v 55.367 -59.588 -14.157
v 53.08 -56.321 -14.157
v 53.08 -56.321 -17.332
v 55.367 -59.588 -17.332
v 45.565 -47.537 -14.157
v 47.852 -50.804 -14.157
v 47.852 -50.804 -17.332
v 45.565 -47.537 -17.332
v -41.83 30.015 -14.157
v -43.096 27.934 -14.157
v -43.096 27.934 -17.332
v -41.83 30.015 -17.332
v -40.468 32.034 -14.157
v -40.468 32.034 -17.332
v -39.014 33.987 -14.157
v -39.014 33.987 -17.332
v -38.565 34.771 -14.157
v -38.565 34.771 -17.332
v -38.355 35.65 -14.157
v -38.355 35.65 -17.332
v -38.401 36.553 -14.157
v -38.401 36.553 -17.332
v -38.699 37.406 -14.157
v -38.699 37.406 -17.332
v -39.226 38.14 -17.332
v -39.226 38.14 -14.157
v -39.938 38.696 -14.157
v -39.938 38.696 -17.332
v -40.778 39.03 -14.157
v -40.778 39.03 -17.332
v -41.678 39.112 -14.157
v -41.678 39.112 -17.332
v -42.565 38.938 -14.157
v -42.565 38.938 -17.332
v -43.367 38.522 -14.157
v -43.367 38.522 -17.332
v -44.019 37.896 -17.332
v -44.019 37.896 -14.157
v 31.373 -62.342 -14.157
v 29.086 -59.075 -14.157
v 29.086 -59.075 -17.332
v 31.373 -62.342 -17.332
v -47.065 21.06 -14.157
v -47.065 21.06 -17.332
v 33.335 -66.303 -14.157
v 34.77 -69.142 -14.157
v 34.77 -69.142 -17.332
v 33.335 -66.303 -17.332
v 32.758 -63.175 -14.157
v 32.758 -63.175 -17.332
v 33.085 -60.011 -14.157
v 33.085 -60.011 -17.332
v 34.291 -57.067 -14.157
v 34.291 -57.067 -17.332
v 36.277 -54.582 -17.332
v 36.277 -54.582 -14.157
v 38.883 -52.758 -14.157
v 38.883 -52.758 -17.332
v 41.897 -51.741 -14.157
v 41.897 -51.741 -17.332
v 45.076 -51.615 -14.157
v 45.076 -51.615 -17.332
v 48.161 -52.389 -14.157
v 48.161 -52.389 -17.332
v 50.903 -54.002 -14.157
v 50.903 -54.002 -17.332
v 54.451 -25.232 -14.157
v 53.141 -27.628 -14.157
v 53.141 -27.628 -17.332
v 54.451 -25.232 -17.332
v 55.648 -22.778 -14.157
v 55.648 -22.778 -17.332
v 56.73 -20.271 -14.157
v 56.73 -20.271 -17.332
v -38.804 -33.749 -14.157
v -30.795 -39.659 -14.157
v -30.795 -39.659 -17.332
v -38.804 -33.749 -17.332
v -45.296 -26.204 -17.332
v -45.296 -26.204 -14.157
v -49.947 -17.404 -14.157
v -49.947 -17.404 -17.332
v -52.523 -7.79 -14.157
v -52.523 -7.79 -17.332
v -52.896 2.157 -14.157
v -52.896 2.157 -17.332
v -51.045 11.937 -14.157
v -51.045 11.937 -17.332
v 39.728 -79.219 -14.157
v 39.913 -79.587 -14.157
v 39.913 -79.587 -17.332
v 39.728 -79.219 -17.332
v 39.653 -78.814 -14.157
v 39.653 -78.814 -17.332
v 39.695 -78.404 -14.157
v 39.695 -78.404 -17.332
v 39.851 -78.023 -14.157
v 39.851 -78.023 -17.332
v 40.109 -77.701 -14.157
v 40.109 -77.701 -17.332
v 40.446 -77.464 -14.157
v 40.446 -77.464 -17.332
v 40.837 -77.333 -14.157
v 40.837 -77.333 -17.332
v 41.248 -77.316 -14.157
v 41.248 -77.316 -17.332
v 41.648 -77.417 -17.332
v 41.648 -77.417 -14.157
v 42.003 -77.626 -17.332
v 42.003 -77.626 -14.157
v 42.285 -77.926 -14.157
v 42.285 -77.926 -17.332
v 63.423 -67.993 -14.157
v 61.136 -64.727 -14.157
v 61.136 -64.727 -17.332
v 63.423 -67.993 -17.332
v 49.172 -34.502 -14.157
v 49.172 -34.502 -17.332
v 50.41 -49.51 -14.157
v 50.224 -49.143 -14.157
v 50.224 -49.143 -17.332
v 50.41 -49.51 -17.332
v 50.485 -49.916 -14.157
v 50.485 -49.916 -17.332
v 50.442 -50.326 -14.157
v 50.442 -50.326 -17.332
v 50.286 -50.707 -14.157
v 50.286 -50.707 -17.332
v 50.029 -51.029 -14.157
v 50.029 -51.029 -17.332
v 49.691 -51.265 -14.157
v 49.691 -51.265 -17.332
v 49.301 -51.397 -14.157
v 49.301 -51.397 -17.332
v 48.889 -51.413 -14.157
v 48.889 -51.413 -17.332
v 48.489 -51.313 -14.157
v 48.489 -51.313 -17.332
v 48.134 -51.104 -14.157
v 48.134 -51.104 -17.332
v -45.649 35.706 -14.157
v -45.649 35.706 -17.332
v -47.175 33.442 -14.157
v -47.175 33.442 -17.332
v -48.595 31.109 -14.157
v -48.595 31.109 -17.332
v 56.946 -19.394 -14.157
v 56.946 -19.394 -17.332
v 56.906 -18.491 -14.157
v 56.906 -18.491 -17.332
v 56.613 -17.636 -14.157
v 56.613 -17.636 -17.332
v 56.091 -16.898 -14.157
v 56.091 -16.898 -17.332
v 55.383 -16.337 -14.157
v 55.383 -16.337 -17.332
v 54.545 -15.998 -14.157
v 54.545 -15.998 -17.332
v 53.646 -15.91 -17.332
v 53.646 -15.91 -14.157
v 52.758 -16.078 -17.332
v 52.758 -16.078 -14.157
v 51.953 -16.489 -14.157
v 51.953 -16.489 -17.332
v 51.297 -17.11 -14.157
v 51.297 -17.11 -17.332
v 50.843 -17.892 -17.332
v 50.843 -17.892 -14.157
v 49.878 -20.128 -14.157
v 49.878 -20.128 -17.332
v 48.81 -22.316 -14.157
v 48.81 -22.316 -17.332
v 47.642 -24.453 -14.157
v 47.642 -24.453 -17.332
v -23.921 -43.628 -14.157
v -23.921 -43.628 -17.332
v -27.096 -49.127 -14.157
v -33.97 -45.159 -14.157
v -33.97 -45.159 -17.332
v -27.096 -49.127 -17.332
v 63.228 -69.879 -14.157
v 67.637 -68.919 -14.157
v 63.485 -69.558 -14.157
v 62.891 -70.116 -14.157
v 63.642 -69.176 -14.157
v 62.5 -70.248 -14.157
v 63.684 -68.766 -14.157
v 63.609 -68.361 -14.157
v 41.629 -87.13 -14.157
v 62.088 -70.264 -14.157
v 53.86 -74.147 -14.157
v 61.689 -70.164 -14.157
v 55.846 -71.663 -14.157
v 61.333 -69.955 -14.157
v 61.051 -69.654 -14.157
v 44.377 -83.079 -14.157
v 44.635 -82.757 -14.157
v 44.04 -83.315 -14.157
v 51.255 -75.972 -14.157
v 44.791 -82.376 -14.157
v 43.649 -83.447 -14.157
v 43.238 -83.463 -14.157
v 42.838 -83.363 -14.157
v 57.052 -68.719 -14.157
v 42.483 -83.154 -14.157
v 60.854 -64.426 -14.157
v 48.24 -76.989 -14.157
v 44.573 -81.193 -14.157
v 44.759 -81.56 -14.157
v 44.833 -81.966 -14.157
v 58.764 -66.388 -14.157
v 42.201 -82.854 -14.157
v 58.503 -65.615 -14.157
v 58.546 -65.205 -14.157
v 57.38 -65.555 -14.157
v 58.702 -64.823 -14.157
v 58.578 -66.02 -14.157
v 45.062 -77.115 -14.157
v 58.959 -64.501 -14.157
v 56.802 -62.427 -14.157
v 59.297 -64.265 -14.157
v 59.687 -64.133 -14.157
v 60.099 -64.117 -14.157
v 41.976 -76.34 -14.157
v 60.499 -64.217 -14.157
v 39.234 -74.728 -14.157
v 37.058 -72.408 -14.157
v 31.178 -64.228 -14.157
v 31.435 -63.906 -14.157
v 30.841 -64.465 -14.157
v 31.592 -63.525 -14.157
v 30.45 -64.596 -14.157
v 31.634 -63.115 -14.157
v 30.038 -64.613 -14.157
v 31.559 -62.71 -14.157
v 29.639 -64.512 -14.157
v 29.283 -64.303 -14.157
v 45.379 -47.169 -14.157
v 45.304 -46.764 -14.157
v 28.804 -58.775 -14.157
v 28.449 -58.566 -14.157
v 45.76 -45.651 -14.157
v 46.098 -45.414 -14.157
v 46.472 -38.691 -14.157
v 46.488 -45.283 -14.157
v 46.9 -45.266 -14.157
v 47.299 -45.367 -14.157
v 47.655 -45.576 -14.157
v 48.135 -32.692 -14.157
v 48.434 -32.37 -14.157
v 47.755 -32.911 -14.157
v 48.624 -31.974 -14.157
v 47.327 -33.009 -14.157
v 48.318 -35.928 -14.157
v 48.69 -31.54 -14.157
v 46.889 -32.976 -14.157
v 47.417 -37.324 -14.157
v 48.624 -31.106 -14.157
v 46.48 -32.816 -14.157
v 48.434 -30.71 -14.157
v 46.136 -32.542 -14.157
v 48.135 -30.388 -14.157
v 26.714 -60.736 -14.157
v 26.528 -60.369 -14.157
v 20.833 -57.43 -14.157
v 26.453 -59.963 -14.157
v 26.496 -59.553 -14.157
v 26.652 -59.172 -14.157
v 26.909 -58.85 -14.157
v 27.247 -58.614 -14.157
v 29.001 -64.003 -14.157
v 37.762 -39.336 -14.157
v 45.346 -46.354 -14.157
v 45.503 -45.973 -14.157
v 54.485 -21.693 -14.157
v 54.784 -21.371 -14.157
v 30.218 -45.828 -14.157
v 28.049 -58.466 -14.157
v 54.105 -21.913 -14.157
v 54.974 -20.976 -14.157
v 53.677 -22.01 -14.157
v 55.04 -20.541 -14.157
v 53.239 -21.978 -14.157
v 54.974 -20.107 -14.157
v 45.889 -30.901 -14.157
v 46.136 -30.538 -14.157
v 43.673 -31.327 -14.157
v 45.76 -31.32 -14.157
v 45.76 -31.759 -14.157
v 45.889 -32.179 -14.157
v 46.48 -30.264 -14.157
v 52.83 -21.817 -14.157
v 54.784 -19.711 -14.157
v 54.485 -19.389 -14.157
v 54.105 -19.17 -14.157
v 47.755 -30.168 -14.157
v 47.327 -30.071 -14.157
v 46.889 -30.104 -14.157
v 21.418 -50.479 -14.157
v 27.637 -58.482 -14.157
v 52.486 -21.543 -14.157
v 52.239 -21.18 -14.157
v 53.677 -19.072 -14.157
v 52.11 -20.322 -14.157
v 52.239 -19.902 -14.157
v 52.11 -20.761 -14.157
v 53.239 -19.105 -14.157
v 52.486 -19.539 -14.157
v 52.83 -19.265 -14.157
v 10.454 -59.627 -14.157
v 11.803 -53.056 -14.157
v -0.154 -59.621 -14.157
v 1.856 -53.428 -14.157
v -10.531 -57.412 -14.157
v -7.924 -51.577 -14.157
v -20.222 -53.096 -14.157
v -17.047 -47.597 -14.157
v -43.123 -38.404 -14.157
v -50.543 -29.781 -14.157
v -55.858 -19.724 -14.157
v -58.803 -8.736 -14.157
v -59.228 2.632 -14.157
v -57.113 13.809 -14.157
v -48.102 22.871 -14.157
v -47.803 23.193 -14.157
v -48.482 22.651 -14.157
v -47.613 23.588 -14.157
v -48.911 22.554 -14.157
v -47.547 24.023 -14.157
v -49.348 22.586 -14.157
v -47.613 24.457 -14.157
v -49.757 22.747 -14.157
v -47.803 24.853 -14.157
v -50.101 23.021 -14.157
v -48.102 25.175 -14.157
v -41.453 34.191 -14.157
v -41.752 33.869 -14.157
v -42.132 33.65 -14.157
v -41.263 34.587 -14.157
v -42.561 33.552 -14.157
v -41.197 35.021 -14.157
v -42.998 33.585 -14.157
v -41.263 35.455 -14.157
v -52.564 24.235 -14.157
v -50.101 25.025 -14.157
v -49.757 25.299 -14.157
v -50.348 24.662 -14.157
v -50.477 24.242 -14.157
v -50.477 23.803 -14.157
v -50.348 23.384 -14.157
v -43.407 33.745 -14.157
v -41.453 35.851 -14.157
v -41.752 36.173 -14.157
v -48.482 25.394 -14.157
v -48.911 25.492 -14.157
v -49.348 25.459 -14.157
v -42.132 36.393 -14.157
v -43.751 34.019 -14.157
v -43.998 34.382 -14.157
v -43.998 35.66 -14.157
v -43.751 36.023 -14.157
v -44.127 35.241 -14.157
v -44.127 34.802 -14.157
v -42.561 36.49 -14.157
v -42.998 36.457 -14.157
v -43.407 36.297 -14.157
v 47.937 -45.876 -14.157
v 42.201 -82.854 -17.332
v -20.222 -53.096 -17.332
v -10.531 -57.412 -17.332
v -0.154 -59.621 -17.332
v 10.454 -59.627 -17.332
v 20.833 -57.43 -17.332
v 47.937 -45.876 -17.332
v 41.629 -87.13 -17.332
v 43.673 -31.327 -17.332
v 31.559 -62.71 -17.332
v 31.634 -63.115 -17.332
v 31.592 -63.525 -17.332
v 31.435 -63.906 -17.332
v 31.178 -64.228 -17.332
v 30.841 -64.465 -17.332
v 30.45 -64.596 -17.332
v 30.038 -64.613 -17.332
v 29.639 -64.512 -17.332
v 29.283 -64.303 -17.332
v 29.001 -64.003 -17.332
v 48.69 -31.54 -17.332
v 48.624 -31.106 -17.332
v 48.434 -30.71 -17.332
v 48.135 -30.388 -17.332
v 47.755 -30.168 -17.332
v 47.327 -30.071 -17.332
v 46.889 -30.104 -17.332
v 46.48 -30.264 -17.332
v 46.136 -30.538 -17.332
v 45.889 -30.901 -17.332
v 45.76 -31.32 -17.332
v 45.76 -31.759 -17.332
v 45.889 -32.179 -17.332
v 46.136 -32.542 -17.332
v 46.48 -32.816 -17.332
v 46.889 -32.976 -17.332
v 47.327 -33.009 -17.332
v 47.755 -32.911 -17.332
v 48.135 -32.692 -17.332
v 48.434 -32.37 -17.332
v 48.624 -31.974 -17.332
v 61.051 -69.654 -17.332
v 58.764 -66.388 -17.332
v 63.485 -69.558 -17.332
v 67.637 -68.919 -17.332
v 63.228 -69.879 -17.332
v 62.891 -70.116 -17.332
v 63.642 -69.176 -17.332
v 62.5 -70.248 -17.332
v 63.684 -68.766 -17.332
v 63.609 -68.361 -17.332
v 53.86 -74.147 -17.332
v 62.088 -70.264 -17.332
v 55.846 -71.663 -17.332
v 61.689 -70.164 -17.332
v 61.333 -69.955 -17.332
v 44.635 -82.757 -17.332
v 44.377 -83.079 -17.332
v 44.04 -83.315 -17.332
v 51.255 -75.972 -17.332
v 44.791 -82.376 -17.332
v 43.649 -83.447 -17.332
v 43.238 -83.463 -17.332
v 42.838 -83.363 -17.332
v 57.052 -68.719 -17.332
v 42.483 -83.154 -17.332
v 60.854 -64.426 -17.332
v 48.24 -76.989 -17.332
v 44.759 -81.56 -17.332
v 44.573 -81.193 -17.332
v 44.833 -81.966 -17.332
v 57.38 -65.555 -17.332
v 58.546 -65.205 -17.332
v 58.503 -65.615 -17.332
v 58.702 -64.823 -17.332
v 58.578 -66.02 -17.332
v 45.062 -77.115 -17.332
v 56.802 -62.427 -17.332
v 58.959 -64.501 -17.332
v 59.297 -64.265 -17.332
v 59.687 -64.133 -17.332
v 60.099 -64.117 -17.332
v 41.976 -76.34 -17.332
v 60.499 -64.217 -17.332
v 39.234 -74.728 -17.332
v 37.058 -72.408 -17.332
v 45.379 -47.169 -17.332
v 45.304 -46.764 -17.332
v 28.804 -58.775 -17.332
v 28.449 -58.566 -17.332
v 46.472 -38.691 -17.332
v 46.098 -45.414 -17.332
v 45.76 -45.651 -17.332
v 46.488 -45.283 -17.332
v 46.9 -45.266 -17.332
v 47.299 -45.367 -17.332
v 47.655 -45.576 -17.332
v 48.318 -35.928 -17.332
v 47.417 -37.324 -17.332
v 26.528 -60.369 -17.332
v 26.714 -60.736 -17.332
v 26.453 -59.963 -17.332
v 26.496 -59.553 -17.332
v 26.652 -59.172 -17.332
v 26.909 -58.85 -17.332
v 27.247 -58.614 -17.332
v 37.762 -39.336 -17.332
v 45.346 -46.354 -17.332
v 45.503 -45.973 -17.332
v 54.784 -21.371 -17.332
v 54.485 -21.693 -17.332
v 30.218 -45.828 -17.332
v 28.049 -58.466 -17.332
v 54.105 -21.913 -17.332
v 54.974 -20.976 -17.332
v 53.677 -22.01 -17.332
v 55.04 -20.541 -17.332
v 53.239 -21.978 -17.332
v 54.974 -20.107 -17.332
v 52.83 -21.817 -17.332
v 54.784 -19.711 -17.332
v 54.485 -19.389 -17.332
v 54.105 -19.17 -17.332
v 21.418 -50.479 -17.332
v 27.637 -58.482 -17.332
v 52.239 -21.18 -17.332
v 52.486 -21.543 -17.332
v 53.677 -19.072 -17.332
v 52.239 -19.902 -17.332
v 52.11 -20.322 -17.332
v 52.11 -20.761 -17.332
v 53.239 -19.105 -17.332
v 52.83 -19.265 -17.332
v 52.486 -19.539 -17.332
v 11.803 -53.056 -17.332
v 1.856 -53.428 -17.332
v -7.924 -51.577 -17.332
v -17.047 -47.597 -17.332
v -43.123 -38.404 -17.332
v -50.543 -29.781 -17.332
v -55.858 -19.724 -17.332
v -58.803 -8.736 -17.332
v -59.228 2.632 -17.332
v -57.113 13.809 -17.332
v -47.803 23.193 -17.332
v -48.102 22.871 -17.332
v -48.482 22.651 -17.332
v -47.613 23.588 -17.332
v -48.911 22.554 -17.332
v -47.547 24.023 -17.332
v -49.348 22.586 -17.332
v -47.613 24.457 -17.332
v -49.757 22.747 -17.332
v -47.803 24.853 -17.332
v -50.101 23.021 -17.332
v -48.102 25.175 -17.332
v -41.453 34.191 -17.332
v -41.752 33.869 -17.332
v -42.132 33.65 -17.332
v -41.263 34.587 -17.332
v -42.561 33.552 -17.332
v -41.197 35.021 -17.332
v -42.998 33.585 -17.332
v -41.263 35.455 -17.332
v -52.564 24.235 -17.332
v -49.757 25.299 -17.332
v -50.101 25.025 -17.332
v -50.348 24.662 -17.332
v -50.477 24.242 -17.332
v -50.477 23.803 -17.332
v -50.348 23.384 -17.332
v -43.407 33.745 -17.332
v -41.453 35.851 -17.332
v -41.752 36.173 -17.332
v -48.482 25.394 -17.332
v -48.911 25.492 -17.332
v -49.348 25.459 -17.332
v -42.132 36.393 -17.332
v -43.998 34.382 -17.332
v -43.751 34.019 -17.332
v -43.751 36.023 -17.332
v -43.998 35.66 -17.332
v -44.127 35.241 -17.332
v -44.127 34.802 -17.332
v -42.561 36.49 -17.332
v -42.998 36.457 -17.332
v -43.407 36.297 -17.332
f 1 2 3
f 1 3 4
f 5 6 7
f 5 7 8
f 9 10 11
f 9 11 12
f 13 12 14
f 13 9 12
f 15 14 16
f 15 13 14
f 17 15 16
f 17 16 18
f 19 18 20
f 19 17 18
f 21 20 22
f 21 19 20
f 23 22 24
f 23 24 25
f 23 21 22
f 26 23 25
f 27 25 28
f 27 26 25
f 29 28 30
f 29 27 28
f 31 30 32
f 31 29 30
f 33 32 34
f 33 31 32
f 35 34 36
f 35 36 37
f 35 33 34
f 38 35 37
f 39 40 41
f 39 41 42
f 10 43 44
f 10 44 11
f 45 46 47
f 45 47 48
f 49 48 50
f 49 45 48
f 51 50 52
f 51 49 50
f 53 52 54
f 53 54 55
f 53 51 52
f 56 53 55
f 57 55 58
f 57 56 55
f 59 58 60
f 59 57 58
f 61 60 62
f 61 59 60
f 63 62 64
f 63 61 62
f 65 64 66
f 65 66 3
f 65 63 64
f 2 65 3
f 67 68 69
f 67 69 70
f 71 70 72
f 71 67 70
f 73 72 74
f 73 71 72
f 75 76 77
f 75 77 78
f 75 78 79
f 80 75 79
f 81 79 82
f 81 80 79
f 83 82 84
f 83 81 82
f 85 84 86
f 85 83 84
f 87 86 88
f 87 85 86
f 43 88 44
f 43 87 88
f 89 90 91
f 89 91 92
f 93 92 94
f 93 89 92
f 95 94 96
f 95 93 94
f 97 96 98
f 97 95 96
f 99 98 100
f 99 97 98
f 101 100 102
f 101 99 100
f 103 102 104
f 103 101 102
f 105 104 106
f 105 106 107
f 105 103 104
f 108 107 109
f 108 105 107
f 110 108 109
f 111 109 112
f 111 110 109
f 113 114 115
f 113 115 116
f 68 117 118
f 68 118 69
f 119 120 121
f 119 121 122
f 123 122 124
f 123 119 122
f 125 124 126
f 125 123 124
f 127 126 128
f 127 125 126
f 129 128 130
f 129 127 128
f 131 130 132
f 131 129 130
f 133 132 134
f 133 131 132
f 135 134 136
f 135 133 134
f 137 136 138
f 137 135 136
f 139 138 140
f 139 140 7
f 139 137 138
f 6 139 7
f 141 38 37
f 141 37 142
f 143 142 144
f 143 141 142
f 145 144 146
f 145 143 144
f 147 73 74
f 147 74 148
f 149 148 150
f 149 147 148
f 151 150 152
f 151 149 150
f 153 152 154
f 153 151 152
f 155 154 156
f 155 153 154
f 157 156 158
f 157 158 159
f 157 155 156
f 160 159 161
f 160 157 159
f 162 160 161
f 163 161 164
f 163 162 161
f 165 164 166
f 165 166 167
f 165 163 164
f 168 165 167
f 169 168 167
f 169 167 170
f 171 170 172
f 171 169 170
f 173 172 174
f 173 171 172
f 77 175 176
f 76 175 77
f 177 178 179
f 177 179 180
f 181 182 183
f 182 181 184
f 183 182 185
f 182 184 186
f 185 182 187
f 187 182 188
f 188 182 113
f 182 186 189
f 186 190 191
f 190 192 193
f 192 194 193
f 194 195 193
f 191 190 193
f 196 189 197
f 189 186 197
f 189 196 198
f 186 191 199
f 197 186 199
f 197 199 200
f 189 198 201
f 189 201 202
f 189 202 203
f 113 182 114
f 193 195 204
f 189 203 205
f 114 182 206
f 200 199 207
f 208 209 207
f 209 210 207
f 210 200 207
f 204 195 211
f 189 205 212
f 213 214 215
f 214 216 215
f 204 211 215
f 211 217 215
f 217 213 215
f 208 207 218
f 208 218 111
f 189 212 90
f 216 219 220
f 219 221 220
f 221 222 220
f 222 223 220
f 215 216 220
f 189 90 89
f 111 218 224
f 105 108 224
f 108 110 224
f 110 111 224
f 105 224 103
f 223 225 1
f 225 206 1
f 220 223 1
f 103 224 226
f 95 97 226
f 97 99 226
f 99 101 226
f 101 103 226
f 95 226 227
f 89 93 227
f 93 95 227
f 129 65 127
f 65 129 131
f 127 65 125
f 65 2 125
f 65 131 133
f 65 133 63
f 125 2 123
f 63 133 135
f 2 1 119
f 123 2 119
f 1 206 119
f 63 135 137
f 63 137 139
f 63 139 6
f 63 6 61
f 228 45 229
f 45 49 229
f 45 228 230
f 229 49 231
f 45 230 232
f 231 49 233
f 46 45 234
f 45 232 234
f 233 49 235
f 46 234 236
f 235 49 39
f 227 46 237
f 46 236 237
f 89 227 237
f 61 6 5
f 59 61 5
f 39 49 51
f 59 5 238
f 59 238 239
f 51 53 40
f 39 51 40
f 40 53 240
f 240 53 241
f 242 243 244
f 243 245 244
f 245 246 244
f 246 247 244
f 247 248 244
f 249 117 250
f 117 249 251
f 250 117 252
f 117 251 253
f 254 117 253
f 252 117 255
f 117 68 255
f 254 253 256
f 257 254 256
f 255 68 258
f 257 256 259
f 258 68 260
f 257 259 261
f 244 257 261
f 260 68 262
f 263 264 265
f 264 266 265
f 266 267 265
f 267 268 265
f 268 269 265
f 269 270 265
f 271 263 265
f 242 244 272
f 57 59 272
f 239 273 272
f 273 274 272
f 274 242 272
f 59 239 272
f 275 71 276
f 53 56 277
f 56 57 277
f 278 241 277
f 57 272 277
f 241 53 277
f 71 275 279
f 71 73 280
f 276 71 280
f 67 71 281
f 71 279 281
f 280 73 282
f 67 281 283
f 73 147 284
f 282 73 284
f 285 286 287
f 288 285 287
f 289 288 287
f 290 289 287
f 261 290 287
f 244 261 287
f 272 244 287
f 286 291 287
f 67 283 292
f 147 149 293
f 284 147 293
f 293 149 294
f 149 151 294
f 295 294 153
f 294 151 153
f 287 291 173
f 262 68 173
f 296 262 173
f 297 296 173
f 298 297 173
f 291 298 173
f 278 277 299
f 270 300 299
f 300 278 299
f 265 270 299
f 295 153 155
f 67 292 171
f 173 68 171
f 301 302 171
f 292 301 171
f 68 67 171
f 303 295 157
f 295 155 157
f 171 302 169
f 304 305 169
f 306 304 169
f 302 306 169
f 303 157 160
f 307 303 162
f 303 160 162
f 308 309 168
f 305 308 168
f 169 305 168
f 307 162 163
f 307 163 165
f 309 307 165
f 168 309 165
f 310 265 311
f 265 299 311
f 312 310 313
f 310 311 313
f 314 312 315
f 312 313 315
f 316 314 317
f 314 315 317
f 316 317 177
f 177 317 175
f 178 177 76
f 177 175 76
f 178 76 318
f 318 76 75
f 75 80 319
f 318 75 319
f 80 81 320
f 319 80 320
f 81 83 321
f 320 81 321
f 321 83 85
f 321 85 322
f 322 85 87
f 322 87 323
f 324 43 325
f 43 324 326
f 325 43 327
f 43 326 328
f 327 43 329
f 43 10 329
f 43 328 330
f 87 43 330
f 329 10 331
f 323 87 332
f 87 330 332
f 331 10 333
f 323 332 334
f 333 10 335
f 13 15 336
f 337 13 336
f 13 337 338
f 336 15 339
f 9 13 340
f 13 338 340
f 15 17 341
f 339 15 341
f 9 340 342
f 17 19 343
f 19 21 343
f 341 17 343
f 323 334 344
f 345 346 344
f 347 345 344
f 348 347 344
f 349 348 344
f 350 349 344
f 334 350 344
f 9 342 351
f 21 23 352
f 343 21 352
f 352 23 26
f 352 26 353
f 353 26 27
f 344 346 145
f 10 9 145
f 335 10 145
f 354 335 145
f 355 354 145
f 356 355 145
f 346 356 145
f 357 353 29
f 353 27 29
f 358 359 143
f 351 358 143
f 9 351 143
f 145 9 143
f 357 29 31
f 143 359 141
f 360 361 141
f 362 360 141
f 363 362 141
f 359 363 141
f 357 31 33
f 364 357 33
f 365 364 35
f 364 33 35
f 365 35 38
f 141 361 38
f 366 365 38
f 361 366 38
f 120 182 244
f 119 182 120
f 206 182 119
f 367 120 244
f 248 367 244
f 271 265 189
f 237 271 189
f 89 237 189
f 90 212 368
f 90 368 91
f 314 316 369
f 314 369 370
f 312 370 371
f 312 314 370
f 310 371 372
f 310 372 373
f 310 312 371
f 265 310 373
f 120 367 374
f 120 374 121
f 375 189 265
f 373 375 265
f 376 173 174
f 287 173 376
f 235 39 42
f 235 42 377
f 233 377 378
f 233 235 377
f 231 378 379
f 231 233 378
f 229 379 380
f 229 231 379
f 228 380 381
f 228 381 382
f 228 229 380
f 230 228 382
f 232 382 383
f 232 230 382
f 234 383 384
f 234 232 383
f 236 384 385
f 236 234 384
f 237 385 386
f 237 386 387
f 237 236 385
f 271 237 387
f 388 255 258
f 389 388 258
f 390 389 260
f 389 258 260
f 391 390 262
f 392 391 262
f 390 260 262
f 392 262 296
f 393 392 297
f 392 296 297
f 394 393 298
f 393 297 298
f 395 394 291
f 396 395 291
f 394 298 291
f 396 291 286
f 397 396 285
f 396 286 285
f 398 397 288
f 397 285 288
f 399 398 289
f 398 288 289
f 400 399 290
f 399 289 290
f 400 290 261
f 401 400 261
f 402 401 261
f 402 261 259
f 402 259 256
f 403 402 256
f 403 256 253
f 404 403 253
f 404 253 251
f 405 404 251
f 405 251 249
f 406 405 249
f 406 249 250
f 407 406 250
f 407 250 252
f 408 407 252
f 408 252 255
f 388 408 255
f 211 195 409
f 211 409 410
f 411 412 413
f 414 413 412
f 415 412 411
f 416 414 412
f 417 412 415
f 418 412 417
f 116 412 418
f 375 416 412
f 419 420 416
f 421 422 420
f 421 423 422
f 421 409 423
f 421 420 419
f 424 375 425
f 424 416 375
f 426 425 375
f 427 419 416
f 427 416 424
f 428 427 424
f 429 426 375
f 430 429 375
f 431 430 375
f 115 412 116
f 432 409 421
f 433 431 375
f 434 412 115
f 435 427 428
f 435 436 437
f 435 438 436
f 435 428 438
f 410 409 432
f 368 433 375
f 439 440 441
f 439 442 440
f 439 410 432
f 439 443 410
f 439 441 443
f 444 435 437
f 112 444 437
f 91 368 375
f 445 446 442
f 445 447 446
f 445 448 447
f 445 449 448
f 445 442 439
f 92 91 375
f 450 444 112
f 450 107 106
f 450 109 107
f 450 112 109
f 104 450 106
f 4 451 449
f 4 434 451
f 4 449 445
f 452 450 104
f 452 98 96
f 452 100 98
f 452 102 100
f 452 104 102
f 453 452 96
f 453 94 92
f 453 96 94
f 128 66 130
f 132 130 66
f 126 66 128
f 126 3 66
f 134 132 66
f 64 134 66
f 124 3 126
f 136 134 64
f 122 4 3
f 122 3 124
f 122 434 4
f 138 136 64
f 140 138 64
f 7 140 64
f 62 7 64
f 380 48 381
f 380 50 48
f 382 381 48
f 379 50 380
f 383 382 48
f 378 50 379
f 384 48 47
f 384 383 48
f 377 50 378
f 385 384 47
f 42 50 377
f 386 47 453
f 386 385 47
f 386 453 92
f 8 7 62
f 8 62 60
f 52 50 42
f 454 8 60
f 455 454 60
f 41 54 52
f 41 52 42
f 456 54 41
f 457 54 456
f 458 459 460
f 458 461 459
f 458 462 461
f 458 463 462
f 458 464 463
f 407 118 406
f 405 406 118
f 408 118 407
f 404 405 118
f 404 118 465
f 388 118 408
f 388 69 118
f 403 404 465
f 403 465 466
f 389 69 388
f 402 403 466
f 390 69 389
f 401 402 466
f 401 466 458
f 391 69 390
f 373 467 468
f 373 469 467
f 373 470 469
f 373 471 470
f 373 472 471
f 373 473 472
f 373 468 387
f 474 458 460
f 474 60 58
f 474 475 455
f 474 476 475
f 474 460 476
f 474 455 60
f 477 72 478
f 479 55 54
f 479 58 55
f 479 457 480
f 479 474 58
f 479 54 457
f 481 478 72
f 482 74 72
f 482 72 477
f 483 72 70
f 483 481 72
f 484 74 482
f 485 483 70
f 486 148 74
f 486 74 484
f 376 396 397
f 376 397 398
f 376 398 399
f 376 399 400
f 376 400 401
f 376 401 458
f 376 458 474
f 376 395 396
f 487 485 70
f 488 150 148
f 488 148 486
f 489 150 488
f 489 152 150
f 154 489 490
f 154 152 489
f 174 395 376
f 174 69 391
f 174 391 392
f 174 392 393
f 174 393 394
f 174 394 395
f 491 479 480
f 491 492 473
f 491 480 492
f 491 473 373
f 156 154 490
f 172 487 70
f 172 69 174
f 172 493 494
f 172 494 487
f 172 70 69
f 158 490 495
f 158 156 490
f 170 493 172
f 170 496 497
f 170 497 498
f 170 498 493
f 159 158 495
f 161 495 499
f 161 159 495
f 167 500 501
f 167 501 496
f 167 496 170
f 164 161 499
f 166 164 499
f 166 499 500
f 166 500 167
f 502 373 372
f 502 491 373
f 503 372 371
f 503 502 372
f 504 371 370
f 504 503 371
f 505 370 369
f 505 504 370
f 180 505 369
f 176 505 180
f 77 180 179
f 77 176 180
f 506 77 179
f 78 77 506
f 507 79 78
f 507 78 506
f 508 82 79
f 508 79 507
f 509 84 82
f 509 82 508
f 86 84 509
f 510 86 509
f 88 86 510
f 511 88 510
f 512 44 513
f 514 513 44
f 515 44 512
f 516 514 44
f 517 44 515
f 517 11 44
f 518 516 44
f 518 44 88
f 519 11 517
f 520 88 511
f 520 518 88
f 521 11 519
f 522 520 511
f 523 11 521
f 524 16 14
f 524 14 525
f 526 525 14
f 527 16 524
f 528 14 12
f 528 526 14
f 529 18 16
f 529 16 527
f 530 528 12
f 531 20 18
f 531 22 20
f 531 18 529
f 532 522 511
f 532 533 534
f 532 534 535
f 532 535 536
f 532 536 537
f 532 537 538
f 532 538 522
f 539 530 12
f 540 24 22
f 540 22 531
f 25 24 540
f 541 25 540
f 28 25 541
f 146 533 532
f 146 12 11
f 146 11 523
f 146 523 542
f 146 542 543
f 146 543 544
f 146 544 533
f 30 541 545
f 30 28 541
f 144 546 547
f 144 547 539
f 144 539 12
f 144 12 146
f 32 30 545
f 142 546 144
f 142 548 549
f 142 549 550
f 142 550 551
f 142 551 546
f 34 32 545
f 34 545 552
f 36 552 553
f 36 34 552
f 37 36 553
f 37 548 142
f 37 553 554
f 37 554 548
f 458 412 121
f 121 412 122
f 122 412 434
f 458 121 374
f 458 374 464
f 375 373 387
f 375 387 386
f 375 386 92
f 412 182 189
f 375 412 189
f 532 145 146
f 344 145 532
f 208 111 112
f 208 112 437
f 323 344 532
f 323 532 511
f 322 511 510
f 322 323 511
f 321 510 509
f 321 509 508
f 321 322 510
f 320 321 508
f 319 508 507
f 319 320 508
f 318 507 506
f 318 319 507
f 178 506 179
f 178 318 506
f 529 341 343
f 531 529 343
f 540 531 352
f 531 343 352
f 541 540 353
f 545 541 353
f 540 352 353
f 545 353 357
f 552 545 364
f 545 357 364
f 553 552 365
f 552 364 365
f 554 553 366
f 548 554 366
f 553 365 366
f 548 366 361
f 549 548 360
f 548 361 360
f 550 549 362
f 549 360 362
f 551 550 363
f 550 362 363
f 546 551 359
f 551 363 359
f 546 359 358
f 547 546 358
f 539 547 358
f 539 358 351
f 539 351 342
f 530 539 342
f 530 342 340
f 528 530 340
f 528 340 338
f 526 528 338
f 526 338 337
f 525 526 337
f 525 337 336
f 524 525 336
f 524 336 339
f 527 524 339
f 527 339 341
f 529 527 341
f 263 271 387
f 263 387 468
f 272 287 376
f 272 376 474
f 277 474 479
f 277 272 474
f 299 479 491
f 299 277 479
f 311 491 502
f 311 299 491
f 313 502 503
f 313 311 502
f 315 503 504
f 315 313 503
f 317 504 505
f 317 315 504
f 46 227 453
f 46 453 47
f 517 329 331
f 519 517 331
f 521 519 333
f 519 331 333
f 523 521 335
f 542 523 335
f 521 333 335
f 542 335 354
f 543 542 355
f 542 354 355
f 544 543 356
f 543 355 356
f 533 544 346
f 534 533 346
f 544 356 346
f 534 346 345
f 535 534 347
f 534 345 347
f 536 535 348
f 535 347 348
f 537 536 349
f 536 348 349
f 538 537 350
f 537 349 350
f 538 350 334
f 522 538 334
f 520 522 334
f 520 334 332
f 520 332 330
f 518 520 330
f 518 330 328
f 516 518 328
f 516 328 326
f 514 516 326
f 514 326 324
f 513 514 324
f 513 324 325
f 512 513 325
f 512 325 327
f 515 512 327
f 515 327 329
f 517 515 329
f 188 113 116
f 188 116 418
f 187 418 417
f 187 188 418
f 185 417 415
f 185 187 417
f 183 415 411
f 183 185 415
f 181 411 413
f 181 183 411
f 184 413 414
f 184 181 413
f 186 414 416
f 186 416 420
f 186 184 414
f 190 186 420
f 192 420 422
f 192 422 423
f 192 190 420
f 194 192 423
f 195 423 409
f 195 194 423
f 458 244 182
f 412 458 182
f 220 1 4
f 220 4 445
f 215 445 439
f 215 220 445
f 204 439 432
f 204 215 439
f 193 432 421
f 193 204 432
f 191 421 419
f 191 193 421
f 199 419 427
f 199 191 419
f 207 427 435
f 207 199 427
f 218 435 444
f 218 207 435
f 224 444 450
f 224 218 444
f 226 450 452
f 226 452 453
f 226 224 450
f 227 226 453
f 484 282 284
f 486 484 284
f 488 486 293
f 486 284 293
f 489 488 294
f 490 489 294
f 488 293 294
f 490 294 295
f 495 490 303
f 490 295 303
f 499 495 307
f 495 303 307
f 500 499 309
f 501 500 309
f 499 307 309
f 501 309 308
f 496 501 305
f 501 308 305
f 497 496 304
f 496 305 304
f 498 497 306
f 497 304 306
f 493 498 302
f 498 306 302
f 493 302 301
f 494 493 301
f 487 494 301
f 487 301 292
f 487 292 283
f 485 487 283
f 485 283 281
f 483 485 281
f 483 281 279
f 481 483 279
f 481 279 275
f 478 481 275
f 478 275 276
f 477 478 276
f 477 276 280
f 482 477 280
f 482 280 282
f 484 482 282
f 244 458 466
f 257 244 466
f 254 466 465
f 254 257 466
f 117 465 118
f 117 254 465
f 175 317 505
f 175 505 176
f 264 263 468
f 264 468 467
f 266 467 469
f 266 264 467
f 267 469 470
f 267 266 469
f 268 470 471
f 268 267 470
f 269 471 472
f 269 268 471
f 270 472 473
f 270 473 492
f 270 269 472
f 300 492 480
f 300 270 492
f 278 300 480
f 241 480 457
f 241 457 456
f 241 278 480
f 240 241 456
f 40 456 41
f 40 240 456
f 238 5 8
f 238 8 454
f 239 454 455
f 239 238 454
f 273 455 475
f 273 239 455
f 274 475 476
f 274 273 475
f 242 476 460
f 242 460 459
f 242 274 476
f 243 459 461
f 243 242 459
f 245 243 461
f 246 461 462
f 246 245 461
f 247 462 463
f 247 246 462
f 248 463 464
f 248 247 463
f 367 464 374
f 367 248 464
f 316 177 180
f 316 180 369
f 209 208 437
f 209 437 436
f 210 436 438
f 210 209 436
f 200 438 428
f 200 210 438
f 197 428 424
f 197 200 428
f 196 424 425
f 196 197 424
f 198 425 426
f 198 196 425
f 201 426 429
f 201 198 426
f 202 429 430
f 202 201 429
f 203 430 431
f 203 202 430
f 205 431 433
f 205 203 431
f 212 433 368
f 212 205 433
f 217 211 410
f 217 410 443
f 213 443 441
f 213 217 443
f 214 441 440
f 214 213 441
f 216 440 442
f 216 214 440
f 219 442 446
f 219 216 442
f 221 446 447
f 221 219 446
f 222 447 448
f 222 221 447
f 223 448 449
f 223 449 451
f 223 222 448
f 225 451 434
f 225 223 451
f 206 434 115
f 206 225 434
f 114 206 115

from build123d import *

# Parameters (mm, degrees)
BOSS_EXTRUDE1_DEPTH   = 3.175
BOSS_EXTRUDE2_DEPTH   = 3.175
F_4_CLEARANCE_HOLE1_D = 2.9464


with BuildPart() as part:
    # Sketch1 → Boss-Extrude1 (new body)
    with BuildSketch(Plane(origin=(0, 0, -14.15699402), x_dir=(-1, 0, 0), z_dir=(0, 0, -1))):
        with BuildLine():
            Line((-49.172312317, -34.502108483), (-53.141062317, -27.628031841))
            ThreePointArc((-53.141062317, -27.628031841), (-55.063803638, -24.012221257), (-56.72992661, -20.271224785))
            ThreePointArc((-56.72992661, -20.271224785), (-54.976138042, -16.13776671), (-50.842679967, -17.891555277))
            ThreePointArc((-50.842679967, -17.891555277), (-49.356678398, -21.228119699), (-47.641801003, -24.453031841))
            Line((-47.641801003, -24.453031841), (-43.673051003, -31.327108483))
            ThreePointArc((-43.673051003, -31.327108483), (-16.68272836, -52.037511462), (17.046778195, -47.596937682))
            Line((17.046778195, -47.596937682), (23.920854837, -43.628187682))
            Line((23.920854837, -43.628187682), (30.79493148, -39.659437682))
            ThreePointArc((30.79493148, -39.659437682), (51.505334458, -12.669115038), (47.064760678, 21.060391517))
            Line((47.064760678, 21.060391517), (43.096010678, 27.934468159))
            ThreePointArc((43.096010678, 27.934468159), (41.160593535, 31.032051618), (39.01404477, 33.987248938))
            ThreePointArc((39.01404477, 33.987248938), (39.561948355, 38.44382292), (44.018522337, 37.895919335))
            ThreePointArc((44.018522337, 37.895919335), (46.425258832, 34.58251628), (48.595271992, 31.109468159))
            Line((48.595271992, 31.109468159), (52.564021992, 24.235391517))
            ThreePointArc((52.564021992, 24.235391517), (57.638963455, -14.312615975), (33.96993148, -45.158698996))
            Line((33.96993148, -45.158698996), (27.095854837, -49.127448996))
            Line((27.095854837, -49.127448996), (20.221778195, -53.096198996))
            ThreePointArc((20.221778195, -53.096198996), (-18.326229296, -58.171140459), (-49.172312317, -34.502108483))
        make_face()
    extrude(amount=BOSS_EXTRUDE1_DEPTH)

    # Sketch6 → Boss-Extrude2 (add)
    with BuildSketch(Plane.XY.offset(-14.15699402)):
        Polygon((67.637194266, -68.918706291), (41.629116859, -87.129758146), (18.471608801, -54.057409171), (44.479686207, -35.846357317), align=None)
        with BuildLine():
            Line((53.079900319, -56.321192451), (55.367208432, -59.587806973))
            ThreePointArc((55.367208432, -59.587806973), (52.622655438, -75.152940473), (37.057521938, -72.408387479))
            Line((37.057521938, -72.408387479), (34.770213825, -69.141772956))
            ThreePointArc((34.770213825, -69.141772956), (37.51476682, -53.576639457), (53.079900319, -56.321192451))
        make_face(mode=Mode.SUBTRACT)
        with BuildLine():
            Line((42.200754795, -82.853533634), (39.913446682, -79.586919112))
            ThreePointArc((39.913446682, -79.586919112), (40.268991048, -77.570526818), (42.285383342, -77.926071183))
            Line((42.285383342, -77.926071183), (44.572691455, -81.192685705))
            ThreePointArc((44.572691455, -81.192685705), (44.21714709, -83.209078), (42.200754795, -82.853533634))
        make_face(mode=Mode.SUBTRACT)
        with BuildLine():
            Line((29.086012958, -59.075416679), (31.373321071, -62.342031201))
            ThreePointArc((31.373321071, -62.342031201), (31.017776706, -64.358423496), (29.001384411, -64.00287913))
            Line((29.001384411, -64.00287913), (26.714076299, -60.736264608))
            ThreePointArc((26.714076299, -60.736264608), (27.069620664, -58.719872314), (29.086012958, -59.075416679))
        make_face(mode=Mode.SUBTRACT)
        with BuildLine():
            Line((47.936667462, -45.876046295), (50.223975575, -49.142660817))
            ThreePointArc((50.223975575, -49.142660817), (49.86843121, -51.159053112), (47.852038915, -50.803508747))
            Line((47.852038915, -50.803508747), (45.564730803, -47.536894224))
            ThreePointArc((45.564730803, -47.536894224), (45.920275168, -45.52050193), (47.936667462, -45.876046295))
        make_face(mode=Mode.SUBTRACT)
        with BuildLine():
            Line((61.136037846, -64.726700799), (63.423345959, -67.993315321))
            ThreePointArc((63.423345959, -67.993315321), (63.067801594, -70.009707616), (61.051409299, -69.654163251))
            Line((61.051409299, -69.654163251), (58.764101186, -66.387548728))
            ThreePointArc((58.764101186, -66.387548728), (59.119645552, -64.371156434), (61.136037846, -64.726700799))
        make_face(mode=Mode.SUBTRACT)
    extrude(amount=-BOSS_EXTRUDE2_DEPTH)

    # #4 Clearance Hole1 (through all)
    with Locations(Plane(origin=(0, 0, -17.33199402), x_dir=(-1, 0, 0), z_dir=(0, 0, -1))):
        with Locations((-53.56643166, -20.541270527), (-47.21643166, -31.539793155), (42.670641335, 35.021229473), (49.020641335, 24.022706845)):
            Hole(F_4_CLEARANCE_HOLE1_D / 2)


solid = part.part
